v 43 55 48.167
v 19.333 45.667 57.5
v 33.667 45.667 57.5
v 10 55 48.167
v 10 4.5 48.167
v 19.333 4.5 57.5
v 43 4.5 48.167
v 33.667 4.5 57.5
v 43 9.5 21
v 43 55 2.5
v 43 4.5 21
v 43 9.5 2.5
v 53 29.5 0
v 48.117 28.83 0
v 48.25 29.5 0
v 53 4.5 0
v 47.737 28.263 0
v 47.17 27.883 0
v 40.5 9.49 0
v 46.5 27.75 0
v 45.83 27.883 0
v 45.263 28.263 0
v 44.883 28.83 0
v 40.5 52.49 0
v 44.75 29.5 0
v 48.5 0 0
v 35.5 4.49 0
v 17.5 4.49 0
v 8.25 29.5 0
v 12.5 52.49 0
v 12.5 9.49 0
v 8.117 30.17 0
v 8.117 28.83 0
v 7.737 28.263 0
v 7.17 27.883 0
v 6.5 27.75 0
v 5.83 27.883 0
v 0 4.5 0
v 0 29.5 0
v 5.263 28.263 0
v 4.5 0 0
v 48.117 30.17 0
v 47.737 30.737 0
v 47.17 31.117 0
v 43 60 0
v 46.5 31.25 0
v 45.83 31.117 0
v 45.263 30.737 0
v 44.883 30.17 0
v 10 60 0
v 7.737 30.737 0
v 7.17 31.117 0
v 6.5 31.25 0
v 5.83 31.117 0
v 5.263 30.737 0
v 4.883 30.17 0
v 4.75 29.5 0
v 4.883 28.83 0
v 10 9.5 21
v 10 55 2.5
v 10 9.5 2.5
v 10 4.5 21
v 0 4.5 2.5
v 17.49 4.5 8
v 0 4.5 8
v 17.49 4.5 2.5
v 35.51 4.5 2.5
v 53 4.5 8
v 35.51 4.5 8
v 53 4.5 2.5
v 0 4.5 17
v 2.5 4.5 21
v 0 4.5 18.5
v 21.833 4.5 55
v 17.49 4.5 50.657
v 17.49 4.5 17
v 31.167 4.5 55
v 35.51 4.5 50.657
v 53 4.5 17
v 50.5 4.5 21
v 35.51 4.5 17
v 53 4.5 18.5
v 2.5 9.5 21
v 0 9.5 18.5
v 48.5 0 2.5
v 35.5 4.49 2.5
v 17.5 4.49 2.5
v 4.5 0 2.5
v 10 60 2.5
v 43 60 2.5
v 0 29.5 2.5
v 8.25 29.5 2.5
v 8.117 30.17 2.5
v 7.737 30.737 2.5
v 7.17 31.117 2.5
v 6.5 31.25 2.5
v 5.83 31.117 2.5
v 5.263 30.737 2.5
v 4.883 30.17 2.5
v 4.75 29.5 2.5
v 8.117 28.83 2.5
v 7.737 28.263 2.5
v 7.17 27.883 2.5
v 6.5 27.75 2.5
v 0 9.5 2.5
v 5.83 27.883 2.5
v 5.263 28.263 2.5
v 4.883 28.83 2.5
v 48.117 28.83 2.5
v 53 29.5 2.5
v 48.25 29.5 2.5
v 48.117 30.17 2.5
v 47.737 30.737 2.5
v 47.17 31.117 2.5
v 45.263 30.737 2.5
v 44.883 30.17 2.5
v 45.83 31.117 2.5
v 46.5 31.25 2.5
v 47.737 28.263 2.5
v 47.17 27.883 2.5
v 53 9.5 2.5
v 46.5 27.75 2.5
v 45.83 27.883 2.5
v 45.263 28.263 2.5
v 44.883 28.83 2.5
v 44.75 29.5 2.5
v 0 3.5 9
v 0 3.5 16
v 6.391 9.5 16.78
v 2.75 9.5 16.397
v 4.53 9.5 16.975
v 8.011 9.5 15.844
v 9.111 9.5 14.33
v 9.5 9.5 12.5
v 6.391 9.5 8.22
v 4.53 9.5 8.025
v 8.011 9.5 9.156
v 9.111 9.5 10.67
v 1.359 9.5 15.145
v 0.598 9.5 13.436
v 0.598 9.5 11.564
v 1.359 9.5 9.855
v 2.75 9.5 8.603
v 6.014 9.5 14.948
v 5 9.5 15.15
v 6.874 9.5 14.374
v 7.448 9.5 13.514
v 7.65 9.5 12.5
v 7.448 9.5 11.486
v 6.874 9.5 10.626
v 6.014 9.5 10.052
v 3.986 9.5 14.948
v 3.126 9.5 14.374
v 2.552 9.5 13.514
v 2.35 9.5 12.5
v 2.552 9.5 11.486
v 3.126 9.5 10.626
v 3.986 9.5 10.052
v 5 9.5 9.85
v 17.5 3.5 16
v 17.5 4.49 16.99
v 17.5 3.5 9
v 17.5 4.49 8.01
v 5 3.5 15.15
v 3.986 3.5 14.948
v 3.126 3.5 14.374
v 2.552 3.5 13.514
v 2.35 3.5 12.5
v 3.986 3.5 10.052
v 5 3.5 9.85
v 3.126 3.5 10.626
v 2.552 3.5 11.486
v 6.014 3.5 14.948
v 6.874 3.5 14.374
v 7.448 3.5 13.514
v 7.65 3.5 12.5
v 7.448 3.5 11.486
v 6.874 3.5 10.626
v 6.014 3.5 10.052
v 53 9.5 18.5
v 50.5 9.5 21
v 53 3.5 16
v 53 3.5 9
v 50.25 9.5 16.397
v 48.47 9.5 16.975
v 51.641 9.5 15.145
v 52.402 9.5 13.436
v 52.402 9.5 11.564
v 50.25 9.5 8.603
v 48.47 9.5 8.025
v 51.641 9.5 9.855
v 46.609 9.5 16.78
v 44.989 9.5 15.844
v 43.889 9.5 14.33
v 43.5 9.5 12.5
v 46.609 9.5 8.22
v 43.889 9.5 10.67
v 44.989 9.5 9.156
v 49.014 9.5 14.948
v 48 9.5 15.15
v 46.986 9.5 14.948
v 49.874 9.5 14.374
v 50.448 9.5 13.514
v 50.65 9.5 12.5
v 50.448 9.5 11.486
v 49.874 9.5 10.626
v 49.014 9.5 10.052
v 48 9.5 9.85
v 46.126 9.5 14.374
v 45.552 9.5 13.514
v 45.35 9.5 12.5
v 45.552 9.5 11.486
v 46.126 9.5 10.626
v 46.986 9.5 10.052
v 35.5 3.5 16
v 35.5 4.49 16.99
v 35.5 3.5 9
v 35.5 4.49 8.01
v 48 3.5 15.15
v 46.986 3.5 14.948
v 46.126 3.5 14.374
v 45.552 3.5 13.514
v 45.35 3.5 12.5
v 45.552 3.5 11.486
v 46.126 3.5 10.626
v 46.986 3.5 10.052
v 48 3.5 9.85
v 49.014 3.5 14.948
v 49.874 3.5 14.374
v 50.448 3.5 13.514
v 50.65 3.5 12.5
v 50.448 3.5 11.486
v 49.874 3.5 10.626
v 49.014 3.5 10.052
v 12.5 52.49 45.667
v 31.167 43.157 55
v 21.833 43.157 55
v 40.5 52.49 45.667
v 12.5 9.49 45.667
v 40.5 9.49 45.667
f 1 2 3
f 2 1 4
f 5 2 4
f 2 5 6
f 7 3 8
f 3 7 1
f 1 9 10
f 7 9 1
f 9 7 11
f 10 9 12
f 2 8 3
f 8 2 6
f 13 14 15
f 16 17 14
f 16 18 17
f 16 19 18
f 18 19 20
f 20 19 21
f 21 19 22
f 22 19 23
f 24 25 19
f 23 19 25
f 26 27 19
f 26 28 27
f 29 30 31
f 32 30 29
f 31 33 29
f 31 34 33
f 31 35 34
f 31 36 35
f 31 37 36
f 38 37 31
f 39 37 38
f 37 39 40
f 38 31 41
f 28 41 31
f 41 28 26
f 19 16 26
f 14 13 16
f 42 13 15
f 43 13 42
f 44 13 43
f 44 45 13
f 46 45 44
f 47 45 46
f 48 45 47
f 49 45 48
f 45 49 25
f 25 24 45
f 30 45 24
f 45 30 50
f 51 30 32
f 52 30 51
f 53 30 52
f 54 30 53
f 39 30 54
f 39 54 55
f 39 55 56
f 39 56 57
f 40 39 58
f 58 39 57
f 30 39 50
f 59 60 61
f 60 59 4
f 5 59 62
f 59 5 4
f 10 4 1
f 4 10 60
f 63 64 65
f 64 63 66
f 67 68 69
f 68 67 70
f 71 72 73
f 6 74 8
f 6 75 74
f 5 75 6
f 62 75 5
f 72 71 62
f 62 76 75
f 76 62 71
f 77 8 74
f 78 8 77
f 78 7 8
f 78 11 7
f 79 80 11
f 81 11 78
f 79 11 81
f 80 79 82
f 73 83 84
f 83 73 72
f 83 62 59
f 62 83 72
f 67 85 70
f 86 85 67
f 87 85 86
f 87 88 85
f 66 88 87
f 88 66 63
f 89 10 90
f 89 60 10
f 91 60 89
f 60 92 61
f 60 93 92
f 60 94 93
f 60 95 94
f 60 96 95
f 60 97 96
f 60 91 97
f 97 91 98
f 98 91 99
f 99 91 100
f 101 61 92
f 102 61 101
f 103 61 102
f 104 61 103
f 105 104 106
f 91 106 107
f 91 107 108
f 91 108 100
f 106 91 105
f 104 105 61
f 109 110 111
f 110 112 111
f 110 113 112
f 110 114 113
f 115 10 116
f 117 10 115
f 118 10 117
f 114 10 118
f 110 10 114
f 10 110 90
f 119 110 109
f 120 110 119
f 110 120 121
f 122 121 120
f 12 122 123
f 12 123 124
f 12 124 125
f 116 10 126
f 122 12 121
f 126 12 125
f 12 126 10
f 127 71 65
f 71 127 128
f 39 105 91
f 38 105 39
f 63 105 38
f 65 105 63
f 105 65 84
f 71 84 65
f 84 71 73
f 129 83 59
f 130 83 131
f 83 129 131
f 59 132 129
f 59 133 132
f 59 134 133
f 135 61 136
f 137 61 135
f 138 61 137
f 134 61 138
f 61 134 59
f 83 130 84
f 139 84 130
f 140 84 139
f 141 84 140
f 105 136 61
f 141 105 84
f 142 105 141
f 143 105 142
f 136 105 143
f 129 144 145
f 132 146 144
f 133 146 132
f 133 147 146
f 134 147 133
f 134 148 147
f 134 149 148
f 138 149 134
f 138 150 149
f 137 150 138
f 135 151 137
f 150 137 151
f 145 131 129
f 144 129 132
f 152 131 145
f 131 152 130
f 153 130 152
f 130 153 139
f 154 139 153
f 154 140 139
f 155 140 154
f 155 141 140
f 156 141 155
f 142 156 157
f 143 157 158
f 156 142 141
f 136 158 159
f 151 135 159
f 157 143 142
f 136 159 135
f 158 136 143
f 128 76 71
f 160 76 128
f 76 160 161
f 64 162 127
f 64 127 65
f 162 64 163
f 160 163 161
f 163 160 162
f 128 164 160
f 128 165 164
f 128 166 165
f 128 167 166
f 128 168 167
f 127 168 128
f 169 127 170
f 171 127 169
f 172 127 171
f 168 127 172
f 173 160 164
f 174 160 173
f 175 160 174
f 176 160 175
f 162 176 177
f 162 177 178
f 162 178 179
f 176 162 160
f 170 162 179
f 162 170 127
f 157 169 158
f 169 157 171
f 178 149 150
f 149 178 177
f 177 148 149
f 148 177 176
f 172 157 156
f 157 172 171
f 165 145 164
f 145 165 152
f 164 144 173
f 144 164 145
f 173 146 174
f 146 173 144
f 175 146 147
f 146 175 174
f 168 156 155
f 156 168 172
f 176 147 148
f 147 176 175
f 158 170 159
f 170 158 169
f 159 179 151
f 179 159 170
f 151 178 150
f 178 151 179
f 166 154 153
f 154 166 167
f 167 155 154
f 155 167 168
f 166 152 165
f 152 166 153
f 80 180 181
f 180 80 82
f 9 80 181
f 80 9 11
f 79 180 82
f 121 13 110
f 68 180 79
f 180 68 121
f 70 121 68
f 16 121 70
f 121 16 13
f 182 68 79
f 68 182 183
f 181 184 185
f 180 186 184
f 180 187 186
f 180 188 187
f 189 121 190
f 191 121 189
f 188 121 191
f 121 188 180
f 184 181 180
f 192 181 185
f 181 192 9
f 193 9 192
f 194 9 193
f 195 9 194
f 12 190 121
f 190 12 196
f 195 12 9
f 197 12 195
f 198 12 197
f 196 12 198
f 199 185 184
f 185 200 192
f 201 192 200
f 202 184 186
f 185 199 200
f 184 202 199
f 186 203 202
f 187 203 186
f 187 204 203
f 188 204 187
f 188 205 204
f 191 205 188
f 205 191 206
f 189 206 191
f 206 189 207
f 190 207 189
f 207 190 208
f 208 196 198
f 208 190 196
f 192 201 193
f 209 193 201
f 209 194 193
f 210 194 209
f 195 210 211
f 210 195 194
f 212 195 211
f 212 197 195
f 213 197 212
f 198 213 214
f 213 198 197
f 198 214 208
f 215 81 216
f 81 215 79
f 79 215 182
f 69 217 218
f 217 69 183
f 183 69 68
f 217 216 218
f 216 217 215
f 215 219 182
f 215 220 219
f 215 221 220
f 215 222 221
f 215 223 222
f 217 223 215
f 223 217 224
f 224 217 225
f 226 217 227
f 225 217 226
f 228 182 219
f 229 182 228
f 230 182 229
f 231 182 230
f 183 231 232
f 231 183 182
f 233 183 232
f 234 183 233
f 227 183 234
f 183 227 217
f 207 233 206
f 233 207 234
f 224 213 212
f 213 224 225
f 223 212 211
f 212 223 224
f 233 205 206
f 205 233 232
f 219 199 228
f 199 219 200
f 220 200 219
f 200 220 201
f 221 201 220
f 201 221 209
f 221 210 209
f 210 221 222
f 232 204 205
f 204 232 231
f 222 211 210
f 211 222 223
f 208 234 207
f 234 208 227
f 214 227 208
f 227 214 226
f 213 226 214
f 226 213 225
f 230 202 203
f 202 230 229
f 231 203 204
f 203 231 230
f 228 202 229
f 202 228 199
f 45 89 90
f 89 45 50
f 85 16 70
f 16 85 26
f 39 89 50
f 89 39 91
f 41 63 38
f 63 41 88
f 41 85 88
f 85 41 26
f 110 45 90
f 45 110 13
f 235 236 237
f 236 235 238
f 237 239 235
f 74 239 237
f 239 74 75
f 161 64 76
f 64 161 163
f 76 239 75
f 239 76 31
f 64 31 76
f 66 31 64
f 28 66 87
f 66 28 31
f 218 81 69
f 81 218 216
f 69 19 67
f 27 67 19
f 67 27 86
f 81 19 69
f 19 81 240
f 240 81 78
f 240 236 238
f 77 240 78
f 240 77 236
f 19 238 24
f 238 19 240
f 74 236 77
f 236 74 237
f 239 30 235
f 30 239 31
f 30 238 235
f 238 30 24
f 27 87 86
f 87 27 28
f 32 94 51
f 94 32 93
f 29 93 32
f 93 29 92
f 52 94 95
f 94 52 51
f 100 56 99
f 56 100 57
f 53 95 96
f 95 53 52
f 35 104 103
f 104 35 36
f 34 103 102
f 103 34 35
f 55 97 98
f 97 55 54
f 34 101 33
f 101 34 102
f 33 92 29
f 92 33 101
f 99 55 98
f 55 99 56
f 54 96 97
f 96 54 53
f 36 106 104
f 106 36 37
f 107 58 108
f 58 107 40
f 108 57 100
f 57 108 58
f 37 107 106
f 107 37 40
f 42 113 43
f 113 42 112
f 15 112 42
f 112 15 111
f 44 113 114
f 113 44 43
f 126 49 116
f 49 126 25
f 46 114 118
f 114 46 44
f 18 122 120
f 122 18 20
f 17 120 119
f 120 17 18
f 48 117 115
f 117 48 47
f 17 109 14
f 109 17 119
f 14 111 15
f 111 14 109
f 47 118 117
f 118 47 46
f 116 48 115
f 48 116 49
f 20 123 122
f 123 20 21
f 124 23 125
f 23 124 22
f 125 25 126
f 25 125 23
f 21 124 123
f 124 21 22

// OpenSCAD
// preview[view:northeast, tilt:topdiagonal]

/* [Basic] */
// Thickness of walls
t=2.5;
// extra space behind the plug for wires
sock_ex_h=34;   

/* [Advanced] */
sock_w=28;
sock_d=48;
sock_h=21;
// extra faceplate on bottom
sock_ex_b=4.5;
// extra faceplate on top
sock_ex_t=7.5;
sock_fillet=5;

// Overall width
f_w=48+2*t;

/* [Hidden] */
f_d=sock_d+sock_ex_b+sock_ex_t;
f_corner=(f_w-sock_w-2*t)/2;

e=0.01;

power_plug();

module mount_screw() {
  // screw hole
  translate([0,0,-e]) cylinder(2*t+2*e, d=3.5, $fn=16);
  // nut clearout
  translate([0,0,t+e]) rotate(30) cylinder(sock_h+sock_ex_h+2*t+2*e, d=7, $fn=6);
}

module mount_ear() {
  w=f_corner;
  tt=5;
  
  difference() {
    union() {
      cube_fillet([w,tt,sock_h-t], top=[0,2.5]);
      translate([0,-1,(20-9)/2])
        cube_fillet([w+sock_fillet+t,1,9], bottom=[0,0,1], top=[0,0,1]);
    }
    // M5 screw
    translate([w/2,0,20/2]) rotate([-90]) {
      translate([0,0,-1-e]) cylinder(tt+1+2*e, d=5.3, $fn=16);
      // screw cap
      translate([0,0,5]) cylinder(tt-5+2*e, d=9);
    }
  }
}

module power_plug() {
difference() {
  union() {
    // faceplate
    linear_extrude(height=t) polygon([
      [0,sock_ex_b], [sock_ex_b,0], [f_w-sock_ex_b,0], [f_w,sock_ex_b],
      [f_w,sock_ex_b+25], [f_w-f_corner,f_d], [f_corner,f_d],
      [0,sock_ex_b+25]
    ]);
    // sock body
    translate([f_corner,sock_ex_b,0])
      cube_fillet([sock_w+2*t, sock_d+t, sock_h+sock_ex_h+t],
        top=[sock_w/3,sock_w/3,0,sock_w/3]);

    translate([0,sock_ex_b,t]) {
      // left mounting ear
      mount_ear();
      // right mounting ear
      translate([f_w,0,0]) mirror([1]) mount_ear();
    }
  }
  
  // begin difference
  // main socket hole
  translate([(f_w-sock_w)/2,sock_ex_b-e,-e])
    cube_fillet([sock_w, sock_d, sock_h+sock_ex_h+e],
      vertical=[0,0,sock_fillet,sock_fillet], top=[sock_w/3,sock_w/3,0,sock_w/3]);
  // screw holes
  translate([(f_w-40)/2,25+sock_ex_b,0]) {
    mount_screw();
    translate([40,0,0]) mount_screw();
  }

}
} /* end module power_plug */

/** END OF POWER_PLUG - BEGIN INCLUDES **/
module nut(d,h,horizontal=true){
    cornerdiameter =  (d / 2) / cos (180 / 6);
    cylinder(h = h, r = cornerdiameter, $fn = 6);
    if(horizontal){
        for(i = [1:6]){
            rotate([0,0,60*i]) translate([-cornerdiameter-0.2,0,0]) rotate([0,0,-45]) cube([2,2,h]);
        }
    }
}

module fillet(radius, height=100, $fn=$fn) {
  if (radius > 0) {
    //this creates acutal fillet
    translate([-radius, -radius, -height / 2 - 0.02]) difference() {
        cube([radius * 2, radius * 2, height + 0.04]);
        if ($fn == 0 && (radius == 2 || radius == 3 || radius == 4)) {
            cylinder(r=radius, h=height + 0.04, $fn=4 * radius);
        } else {
            cylinder(r=radius, h=height + 0.04, $fn=$fn);
        }

    }
  }
}

module cube_fillet(size, radius=-1, vertical=[0,0,0,0], top=[0,0,0,0], bottom=[0,0,0,0], center=false, $fn=4){
    if (center) {
        cube_fillet_inside(size, radius, vertical, top, bottom, $fn);
    } else {
        translate([size[0]/2, size[1]/2, size[2]/2])
            cube_fillet_inside(size, radius, vertical, top, bottom, $fn);
    }
}

module cube_negative_fillet(size, radius=-1, vertical=[3,3,3,3], top=[0,0,0,0], bottom=[0,0,0,0], $fn=$fn){
    j=[1,0,1,0];

    for (i=[0:3]) {
        if (radius > -1) {
            rotate([0, 0, 90*i]) translate([size[1-j[i]]/2, size[j[i]]/2, 0]) fillet(radius, size[2], $fn);
        } else {
            rotate([0, 0, 90*i]) translate([size[1-j[i]]/2, size[j[i]]/2, 0]) fillet(vertical[i], size[2], $fn);
        }
        rotate([90*i, -90, 0]) translate([size[2]/2, size[j[i]]/2, 0 ]) fillet(top[i], size[1-j[i]], $fn);
        rotate([90*(4-i), 90, 0]) translate([size[2]/2, size[j[i]]/2, 0]) fillet(bottom[i], size[1-j[i]], $fn);

    }
}

module cube_fillet_inside(size, radius=-1, vertical=[3,3,3,3], top=[0,0,0,0], bottom=[0,0,0,0], $fn=$fn){
    //makes CENTERED cube with round corners
    // if you give it radius, it will fillet vertical corners.
    //othervise use vertical, top, bottom arrays
    //when viewed from top, it starts in upper right corner (+x,+y quadrant) , goes counterclockwise
    //top/bottom fillet starts in direction of Y axis and goes CCW too

    if (radius == 0) {
        cube(size, center=true);
    } else {
        difference() {
            cube(size, center=true);
            cube_negative_fillet(size, radius, vertical, top, bottom, $fn);
        }
    }
}
